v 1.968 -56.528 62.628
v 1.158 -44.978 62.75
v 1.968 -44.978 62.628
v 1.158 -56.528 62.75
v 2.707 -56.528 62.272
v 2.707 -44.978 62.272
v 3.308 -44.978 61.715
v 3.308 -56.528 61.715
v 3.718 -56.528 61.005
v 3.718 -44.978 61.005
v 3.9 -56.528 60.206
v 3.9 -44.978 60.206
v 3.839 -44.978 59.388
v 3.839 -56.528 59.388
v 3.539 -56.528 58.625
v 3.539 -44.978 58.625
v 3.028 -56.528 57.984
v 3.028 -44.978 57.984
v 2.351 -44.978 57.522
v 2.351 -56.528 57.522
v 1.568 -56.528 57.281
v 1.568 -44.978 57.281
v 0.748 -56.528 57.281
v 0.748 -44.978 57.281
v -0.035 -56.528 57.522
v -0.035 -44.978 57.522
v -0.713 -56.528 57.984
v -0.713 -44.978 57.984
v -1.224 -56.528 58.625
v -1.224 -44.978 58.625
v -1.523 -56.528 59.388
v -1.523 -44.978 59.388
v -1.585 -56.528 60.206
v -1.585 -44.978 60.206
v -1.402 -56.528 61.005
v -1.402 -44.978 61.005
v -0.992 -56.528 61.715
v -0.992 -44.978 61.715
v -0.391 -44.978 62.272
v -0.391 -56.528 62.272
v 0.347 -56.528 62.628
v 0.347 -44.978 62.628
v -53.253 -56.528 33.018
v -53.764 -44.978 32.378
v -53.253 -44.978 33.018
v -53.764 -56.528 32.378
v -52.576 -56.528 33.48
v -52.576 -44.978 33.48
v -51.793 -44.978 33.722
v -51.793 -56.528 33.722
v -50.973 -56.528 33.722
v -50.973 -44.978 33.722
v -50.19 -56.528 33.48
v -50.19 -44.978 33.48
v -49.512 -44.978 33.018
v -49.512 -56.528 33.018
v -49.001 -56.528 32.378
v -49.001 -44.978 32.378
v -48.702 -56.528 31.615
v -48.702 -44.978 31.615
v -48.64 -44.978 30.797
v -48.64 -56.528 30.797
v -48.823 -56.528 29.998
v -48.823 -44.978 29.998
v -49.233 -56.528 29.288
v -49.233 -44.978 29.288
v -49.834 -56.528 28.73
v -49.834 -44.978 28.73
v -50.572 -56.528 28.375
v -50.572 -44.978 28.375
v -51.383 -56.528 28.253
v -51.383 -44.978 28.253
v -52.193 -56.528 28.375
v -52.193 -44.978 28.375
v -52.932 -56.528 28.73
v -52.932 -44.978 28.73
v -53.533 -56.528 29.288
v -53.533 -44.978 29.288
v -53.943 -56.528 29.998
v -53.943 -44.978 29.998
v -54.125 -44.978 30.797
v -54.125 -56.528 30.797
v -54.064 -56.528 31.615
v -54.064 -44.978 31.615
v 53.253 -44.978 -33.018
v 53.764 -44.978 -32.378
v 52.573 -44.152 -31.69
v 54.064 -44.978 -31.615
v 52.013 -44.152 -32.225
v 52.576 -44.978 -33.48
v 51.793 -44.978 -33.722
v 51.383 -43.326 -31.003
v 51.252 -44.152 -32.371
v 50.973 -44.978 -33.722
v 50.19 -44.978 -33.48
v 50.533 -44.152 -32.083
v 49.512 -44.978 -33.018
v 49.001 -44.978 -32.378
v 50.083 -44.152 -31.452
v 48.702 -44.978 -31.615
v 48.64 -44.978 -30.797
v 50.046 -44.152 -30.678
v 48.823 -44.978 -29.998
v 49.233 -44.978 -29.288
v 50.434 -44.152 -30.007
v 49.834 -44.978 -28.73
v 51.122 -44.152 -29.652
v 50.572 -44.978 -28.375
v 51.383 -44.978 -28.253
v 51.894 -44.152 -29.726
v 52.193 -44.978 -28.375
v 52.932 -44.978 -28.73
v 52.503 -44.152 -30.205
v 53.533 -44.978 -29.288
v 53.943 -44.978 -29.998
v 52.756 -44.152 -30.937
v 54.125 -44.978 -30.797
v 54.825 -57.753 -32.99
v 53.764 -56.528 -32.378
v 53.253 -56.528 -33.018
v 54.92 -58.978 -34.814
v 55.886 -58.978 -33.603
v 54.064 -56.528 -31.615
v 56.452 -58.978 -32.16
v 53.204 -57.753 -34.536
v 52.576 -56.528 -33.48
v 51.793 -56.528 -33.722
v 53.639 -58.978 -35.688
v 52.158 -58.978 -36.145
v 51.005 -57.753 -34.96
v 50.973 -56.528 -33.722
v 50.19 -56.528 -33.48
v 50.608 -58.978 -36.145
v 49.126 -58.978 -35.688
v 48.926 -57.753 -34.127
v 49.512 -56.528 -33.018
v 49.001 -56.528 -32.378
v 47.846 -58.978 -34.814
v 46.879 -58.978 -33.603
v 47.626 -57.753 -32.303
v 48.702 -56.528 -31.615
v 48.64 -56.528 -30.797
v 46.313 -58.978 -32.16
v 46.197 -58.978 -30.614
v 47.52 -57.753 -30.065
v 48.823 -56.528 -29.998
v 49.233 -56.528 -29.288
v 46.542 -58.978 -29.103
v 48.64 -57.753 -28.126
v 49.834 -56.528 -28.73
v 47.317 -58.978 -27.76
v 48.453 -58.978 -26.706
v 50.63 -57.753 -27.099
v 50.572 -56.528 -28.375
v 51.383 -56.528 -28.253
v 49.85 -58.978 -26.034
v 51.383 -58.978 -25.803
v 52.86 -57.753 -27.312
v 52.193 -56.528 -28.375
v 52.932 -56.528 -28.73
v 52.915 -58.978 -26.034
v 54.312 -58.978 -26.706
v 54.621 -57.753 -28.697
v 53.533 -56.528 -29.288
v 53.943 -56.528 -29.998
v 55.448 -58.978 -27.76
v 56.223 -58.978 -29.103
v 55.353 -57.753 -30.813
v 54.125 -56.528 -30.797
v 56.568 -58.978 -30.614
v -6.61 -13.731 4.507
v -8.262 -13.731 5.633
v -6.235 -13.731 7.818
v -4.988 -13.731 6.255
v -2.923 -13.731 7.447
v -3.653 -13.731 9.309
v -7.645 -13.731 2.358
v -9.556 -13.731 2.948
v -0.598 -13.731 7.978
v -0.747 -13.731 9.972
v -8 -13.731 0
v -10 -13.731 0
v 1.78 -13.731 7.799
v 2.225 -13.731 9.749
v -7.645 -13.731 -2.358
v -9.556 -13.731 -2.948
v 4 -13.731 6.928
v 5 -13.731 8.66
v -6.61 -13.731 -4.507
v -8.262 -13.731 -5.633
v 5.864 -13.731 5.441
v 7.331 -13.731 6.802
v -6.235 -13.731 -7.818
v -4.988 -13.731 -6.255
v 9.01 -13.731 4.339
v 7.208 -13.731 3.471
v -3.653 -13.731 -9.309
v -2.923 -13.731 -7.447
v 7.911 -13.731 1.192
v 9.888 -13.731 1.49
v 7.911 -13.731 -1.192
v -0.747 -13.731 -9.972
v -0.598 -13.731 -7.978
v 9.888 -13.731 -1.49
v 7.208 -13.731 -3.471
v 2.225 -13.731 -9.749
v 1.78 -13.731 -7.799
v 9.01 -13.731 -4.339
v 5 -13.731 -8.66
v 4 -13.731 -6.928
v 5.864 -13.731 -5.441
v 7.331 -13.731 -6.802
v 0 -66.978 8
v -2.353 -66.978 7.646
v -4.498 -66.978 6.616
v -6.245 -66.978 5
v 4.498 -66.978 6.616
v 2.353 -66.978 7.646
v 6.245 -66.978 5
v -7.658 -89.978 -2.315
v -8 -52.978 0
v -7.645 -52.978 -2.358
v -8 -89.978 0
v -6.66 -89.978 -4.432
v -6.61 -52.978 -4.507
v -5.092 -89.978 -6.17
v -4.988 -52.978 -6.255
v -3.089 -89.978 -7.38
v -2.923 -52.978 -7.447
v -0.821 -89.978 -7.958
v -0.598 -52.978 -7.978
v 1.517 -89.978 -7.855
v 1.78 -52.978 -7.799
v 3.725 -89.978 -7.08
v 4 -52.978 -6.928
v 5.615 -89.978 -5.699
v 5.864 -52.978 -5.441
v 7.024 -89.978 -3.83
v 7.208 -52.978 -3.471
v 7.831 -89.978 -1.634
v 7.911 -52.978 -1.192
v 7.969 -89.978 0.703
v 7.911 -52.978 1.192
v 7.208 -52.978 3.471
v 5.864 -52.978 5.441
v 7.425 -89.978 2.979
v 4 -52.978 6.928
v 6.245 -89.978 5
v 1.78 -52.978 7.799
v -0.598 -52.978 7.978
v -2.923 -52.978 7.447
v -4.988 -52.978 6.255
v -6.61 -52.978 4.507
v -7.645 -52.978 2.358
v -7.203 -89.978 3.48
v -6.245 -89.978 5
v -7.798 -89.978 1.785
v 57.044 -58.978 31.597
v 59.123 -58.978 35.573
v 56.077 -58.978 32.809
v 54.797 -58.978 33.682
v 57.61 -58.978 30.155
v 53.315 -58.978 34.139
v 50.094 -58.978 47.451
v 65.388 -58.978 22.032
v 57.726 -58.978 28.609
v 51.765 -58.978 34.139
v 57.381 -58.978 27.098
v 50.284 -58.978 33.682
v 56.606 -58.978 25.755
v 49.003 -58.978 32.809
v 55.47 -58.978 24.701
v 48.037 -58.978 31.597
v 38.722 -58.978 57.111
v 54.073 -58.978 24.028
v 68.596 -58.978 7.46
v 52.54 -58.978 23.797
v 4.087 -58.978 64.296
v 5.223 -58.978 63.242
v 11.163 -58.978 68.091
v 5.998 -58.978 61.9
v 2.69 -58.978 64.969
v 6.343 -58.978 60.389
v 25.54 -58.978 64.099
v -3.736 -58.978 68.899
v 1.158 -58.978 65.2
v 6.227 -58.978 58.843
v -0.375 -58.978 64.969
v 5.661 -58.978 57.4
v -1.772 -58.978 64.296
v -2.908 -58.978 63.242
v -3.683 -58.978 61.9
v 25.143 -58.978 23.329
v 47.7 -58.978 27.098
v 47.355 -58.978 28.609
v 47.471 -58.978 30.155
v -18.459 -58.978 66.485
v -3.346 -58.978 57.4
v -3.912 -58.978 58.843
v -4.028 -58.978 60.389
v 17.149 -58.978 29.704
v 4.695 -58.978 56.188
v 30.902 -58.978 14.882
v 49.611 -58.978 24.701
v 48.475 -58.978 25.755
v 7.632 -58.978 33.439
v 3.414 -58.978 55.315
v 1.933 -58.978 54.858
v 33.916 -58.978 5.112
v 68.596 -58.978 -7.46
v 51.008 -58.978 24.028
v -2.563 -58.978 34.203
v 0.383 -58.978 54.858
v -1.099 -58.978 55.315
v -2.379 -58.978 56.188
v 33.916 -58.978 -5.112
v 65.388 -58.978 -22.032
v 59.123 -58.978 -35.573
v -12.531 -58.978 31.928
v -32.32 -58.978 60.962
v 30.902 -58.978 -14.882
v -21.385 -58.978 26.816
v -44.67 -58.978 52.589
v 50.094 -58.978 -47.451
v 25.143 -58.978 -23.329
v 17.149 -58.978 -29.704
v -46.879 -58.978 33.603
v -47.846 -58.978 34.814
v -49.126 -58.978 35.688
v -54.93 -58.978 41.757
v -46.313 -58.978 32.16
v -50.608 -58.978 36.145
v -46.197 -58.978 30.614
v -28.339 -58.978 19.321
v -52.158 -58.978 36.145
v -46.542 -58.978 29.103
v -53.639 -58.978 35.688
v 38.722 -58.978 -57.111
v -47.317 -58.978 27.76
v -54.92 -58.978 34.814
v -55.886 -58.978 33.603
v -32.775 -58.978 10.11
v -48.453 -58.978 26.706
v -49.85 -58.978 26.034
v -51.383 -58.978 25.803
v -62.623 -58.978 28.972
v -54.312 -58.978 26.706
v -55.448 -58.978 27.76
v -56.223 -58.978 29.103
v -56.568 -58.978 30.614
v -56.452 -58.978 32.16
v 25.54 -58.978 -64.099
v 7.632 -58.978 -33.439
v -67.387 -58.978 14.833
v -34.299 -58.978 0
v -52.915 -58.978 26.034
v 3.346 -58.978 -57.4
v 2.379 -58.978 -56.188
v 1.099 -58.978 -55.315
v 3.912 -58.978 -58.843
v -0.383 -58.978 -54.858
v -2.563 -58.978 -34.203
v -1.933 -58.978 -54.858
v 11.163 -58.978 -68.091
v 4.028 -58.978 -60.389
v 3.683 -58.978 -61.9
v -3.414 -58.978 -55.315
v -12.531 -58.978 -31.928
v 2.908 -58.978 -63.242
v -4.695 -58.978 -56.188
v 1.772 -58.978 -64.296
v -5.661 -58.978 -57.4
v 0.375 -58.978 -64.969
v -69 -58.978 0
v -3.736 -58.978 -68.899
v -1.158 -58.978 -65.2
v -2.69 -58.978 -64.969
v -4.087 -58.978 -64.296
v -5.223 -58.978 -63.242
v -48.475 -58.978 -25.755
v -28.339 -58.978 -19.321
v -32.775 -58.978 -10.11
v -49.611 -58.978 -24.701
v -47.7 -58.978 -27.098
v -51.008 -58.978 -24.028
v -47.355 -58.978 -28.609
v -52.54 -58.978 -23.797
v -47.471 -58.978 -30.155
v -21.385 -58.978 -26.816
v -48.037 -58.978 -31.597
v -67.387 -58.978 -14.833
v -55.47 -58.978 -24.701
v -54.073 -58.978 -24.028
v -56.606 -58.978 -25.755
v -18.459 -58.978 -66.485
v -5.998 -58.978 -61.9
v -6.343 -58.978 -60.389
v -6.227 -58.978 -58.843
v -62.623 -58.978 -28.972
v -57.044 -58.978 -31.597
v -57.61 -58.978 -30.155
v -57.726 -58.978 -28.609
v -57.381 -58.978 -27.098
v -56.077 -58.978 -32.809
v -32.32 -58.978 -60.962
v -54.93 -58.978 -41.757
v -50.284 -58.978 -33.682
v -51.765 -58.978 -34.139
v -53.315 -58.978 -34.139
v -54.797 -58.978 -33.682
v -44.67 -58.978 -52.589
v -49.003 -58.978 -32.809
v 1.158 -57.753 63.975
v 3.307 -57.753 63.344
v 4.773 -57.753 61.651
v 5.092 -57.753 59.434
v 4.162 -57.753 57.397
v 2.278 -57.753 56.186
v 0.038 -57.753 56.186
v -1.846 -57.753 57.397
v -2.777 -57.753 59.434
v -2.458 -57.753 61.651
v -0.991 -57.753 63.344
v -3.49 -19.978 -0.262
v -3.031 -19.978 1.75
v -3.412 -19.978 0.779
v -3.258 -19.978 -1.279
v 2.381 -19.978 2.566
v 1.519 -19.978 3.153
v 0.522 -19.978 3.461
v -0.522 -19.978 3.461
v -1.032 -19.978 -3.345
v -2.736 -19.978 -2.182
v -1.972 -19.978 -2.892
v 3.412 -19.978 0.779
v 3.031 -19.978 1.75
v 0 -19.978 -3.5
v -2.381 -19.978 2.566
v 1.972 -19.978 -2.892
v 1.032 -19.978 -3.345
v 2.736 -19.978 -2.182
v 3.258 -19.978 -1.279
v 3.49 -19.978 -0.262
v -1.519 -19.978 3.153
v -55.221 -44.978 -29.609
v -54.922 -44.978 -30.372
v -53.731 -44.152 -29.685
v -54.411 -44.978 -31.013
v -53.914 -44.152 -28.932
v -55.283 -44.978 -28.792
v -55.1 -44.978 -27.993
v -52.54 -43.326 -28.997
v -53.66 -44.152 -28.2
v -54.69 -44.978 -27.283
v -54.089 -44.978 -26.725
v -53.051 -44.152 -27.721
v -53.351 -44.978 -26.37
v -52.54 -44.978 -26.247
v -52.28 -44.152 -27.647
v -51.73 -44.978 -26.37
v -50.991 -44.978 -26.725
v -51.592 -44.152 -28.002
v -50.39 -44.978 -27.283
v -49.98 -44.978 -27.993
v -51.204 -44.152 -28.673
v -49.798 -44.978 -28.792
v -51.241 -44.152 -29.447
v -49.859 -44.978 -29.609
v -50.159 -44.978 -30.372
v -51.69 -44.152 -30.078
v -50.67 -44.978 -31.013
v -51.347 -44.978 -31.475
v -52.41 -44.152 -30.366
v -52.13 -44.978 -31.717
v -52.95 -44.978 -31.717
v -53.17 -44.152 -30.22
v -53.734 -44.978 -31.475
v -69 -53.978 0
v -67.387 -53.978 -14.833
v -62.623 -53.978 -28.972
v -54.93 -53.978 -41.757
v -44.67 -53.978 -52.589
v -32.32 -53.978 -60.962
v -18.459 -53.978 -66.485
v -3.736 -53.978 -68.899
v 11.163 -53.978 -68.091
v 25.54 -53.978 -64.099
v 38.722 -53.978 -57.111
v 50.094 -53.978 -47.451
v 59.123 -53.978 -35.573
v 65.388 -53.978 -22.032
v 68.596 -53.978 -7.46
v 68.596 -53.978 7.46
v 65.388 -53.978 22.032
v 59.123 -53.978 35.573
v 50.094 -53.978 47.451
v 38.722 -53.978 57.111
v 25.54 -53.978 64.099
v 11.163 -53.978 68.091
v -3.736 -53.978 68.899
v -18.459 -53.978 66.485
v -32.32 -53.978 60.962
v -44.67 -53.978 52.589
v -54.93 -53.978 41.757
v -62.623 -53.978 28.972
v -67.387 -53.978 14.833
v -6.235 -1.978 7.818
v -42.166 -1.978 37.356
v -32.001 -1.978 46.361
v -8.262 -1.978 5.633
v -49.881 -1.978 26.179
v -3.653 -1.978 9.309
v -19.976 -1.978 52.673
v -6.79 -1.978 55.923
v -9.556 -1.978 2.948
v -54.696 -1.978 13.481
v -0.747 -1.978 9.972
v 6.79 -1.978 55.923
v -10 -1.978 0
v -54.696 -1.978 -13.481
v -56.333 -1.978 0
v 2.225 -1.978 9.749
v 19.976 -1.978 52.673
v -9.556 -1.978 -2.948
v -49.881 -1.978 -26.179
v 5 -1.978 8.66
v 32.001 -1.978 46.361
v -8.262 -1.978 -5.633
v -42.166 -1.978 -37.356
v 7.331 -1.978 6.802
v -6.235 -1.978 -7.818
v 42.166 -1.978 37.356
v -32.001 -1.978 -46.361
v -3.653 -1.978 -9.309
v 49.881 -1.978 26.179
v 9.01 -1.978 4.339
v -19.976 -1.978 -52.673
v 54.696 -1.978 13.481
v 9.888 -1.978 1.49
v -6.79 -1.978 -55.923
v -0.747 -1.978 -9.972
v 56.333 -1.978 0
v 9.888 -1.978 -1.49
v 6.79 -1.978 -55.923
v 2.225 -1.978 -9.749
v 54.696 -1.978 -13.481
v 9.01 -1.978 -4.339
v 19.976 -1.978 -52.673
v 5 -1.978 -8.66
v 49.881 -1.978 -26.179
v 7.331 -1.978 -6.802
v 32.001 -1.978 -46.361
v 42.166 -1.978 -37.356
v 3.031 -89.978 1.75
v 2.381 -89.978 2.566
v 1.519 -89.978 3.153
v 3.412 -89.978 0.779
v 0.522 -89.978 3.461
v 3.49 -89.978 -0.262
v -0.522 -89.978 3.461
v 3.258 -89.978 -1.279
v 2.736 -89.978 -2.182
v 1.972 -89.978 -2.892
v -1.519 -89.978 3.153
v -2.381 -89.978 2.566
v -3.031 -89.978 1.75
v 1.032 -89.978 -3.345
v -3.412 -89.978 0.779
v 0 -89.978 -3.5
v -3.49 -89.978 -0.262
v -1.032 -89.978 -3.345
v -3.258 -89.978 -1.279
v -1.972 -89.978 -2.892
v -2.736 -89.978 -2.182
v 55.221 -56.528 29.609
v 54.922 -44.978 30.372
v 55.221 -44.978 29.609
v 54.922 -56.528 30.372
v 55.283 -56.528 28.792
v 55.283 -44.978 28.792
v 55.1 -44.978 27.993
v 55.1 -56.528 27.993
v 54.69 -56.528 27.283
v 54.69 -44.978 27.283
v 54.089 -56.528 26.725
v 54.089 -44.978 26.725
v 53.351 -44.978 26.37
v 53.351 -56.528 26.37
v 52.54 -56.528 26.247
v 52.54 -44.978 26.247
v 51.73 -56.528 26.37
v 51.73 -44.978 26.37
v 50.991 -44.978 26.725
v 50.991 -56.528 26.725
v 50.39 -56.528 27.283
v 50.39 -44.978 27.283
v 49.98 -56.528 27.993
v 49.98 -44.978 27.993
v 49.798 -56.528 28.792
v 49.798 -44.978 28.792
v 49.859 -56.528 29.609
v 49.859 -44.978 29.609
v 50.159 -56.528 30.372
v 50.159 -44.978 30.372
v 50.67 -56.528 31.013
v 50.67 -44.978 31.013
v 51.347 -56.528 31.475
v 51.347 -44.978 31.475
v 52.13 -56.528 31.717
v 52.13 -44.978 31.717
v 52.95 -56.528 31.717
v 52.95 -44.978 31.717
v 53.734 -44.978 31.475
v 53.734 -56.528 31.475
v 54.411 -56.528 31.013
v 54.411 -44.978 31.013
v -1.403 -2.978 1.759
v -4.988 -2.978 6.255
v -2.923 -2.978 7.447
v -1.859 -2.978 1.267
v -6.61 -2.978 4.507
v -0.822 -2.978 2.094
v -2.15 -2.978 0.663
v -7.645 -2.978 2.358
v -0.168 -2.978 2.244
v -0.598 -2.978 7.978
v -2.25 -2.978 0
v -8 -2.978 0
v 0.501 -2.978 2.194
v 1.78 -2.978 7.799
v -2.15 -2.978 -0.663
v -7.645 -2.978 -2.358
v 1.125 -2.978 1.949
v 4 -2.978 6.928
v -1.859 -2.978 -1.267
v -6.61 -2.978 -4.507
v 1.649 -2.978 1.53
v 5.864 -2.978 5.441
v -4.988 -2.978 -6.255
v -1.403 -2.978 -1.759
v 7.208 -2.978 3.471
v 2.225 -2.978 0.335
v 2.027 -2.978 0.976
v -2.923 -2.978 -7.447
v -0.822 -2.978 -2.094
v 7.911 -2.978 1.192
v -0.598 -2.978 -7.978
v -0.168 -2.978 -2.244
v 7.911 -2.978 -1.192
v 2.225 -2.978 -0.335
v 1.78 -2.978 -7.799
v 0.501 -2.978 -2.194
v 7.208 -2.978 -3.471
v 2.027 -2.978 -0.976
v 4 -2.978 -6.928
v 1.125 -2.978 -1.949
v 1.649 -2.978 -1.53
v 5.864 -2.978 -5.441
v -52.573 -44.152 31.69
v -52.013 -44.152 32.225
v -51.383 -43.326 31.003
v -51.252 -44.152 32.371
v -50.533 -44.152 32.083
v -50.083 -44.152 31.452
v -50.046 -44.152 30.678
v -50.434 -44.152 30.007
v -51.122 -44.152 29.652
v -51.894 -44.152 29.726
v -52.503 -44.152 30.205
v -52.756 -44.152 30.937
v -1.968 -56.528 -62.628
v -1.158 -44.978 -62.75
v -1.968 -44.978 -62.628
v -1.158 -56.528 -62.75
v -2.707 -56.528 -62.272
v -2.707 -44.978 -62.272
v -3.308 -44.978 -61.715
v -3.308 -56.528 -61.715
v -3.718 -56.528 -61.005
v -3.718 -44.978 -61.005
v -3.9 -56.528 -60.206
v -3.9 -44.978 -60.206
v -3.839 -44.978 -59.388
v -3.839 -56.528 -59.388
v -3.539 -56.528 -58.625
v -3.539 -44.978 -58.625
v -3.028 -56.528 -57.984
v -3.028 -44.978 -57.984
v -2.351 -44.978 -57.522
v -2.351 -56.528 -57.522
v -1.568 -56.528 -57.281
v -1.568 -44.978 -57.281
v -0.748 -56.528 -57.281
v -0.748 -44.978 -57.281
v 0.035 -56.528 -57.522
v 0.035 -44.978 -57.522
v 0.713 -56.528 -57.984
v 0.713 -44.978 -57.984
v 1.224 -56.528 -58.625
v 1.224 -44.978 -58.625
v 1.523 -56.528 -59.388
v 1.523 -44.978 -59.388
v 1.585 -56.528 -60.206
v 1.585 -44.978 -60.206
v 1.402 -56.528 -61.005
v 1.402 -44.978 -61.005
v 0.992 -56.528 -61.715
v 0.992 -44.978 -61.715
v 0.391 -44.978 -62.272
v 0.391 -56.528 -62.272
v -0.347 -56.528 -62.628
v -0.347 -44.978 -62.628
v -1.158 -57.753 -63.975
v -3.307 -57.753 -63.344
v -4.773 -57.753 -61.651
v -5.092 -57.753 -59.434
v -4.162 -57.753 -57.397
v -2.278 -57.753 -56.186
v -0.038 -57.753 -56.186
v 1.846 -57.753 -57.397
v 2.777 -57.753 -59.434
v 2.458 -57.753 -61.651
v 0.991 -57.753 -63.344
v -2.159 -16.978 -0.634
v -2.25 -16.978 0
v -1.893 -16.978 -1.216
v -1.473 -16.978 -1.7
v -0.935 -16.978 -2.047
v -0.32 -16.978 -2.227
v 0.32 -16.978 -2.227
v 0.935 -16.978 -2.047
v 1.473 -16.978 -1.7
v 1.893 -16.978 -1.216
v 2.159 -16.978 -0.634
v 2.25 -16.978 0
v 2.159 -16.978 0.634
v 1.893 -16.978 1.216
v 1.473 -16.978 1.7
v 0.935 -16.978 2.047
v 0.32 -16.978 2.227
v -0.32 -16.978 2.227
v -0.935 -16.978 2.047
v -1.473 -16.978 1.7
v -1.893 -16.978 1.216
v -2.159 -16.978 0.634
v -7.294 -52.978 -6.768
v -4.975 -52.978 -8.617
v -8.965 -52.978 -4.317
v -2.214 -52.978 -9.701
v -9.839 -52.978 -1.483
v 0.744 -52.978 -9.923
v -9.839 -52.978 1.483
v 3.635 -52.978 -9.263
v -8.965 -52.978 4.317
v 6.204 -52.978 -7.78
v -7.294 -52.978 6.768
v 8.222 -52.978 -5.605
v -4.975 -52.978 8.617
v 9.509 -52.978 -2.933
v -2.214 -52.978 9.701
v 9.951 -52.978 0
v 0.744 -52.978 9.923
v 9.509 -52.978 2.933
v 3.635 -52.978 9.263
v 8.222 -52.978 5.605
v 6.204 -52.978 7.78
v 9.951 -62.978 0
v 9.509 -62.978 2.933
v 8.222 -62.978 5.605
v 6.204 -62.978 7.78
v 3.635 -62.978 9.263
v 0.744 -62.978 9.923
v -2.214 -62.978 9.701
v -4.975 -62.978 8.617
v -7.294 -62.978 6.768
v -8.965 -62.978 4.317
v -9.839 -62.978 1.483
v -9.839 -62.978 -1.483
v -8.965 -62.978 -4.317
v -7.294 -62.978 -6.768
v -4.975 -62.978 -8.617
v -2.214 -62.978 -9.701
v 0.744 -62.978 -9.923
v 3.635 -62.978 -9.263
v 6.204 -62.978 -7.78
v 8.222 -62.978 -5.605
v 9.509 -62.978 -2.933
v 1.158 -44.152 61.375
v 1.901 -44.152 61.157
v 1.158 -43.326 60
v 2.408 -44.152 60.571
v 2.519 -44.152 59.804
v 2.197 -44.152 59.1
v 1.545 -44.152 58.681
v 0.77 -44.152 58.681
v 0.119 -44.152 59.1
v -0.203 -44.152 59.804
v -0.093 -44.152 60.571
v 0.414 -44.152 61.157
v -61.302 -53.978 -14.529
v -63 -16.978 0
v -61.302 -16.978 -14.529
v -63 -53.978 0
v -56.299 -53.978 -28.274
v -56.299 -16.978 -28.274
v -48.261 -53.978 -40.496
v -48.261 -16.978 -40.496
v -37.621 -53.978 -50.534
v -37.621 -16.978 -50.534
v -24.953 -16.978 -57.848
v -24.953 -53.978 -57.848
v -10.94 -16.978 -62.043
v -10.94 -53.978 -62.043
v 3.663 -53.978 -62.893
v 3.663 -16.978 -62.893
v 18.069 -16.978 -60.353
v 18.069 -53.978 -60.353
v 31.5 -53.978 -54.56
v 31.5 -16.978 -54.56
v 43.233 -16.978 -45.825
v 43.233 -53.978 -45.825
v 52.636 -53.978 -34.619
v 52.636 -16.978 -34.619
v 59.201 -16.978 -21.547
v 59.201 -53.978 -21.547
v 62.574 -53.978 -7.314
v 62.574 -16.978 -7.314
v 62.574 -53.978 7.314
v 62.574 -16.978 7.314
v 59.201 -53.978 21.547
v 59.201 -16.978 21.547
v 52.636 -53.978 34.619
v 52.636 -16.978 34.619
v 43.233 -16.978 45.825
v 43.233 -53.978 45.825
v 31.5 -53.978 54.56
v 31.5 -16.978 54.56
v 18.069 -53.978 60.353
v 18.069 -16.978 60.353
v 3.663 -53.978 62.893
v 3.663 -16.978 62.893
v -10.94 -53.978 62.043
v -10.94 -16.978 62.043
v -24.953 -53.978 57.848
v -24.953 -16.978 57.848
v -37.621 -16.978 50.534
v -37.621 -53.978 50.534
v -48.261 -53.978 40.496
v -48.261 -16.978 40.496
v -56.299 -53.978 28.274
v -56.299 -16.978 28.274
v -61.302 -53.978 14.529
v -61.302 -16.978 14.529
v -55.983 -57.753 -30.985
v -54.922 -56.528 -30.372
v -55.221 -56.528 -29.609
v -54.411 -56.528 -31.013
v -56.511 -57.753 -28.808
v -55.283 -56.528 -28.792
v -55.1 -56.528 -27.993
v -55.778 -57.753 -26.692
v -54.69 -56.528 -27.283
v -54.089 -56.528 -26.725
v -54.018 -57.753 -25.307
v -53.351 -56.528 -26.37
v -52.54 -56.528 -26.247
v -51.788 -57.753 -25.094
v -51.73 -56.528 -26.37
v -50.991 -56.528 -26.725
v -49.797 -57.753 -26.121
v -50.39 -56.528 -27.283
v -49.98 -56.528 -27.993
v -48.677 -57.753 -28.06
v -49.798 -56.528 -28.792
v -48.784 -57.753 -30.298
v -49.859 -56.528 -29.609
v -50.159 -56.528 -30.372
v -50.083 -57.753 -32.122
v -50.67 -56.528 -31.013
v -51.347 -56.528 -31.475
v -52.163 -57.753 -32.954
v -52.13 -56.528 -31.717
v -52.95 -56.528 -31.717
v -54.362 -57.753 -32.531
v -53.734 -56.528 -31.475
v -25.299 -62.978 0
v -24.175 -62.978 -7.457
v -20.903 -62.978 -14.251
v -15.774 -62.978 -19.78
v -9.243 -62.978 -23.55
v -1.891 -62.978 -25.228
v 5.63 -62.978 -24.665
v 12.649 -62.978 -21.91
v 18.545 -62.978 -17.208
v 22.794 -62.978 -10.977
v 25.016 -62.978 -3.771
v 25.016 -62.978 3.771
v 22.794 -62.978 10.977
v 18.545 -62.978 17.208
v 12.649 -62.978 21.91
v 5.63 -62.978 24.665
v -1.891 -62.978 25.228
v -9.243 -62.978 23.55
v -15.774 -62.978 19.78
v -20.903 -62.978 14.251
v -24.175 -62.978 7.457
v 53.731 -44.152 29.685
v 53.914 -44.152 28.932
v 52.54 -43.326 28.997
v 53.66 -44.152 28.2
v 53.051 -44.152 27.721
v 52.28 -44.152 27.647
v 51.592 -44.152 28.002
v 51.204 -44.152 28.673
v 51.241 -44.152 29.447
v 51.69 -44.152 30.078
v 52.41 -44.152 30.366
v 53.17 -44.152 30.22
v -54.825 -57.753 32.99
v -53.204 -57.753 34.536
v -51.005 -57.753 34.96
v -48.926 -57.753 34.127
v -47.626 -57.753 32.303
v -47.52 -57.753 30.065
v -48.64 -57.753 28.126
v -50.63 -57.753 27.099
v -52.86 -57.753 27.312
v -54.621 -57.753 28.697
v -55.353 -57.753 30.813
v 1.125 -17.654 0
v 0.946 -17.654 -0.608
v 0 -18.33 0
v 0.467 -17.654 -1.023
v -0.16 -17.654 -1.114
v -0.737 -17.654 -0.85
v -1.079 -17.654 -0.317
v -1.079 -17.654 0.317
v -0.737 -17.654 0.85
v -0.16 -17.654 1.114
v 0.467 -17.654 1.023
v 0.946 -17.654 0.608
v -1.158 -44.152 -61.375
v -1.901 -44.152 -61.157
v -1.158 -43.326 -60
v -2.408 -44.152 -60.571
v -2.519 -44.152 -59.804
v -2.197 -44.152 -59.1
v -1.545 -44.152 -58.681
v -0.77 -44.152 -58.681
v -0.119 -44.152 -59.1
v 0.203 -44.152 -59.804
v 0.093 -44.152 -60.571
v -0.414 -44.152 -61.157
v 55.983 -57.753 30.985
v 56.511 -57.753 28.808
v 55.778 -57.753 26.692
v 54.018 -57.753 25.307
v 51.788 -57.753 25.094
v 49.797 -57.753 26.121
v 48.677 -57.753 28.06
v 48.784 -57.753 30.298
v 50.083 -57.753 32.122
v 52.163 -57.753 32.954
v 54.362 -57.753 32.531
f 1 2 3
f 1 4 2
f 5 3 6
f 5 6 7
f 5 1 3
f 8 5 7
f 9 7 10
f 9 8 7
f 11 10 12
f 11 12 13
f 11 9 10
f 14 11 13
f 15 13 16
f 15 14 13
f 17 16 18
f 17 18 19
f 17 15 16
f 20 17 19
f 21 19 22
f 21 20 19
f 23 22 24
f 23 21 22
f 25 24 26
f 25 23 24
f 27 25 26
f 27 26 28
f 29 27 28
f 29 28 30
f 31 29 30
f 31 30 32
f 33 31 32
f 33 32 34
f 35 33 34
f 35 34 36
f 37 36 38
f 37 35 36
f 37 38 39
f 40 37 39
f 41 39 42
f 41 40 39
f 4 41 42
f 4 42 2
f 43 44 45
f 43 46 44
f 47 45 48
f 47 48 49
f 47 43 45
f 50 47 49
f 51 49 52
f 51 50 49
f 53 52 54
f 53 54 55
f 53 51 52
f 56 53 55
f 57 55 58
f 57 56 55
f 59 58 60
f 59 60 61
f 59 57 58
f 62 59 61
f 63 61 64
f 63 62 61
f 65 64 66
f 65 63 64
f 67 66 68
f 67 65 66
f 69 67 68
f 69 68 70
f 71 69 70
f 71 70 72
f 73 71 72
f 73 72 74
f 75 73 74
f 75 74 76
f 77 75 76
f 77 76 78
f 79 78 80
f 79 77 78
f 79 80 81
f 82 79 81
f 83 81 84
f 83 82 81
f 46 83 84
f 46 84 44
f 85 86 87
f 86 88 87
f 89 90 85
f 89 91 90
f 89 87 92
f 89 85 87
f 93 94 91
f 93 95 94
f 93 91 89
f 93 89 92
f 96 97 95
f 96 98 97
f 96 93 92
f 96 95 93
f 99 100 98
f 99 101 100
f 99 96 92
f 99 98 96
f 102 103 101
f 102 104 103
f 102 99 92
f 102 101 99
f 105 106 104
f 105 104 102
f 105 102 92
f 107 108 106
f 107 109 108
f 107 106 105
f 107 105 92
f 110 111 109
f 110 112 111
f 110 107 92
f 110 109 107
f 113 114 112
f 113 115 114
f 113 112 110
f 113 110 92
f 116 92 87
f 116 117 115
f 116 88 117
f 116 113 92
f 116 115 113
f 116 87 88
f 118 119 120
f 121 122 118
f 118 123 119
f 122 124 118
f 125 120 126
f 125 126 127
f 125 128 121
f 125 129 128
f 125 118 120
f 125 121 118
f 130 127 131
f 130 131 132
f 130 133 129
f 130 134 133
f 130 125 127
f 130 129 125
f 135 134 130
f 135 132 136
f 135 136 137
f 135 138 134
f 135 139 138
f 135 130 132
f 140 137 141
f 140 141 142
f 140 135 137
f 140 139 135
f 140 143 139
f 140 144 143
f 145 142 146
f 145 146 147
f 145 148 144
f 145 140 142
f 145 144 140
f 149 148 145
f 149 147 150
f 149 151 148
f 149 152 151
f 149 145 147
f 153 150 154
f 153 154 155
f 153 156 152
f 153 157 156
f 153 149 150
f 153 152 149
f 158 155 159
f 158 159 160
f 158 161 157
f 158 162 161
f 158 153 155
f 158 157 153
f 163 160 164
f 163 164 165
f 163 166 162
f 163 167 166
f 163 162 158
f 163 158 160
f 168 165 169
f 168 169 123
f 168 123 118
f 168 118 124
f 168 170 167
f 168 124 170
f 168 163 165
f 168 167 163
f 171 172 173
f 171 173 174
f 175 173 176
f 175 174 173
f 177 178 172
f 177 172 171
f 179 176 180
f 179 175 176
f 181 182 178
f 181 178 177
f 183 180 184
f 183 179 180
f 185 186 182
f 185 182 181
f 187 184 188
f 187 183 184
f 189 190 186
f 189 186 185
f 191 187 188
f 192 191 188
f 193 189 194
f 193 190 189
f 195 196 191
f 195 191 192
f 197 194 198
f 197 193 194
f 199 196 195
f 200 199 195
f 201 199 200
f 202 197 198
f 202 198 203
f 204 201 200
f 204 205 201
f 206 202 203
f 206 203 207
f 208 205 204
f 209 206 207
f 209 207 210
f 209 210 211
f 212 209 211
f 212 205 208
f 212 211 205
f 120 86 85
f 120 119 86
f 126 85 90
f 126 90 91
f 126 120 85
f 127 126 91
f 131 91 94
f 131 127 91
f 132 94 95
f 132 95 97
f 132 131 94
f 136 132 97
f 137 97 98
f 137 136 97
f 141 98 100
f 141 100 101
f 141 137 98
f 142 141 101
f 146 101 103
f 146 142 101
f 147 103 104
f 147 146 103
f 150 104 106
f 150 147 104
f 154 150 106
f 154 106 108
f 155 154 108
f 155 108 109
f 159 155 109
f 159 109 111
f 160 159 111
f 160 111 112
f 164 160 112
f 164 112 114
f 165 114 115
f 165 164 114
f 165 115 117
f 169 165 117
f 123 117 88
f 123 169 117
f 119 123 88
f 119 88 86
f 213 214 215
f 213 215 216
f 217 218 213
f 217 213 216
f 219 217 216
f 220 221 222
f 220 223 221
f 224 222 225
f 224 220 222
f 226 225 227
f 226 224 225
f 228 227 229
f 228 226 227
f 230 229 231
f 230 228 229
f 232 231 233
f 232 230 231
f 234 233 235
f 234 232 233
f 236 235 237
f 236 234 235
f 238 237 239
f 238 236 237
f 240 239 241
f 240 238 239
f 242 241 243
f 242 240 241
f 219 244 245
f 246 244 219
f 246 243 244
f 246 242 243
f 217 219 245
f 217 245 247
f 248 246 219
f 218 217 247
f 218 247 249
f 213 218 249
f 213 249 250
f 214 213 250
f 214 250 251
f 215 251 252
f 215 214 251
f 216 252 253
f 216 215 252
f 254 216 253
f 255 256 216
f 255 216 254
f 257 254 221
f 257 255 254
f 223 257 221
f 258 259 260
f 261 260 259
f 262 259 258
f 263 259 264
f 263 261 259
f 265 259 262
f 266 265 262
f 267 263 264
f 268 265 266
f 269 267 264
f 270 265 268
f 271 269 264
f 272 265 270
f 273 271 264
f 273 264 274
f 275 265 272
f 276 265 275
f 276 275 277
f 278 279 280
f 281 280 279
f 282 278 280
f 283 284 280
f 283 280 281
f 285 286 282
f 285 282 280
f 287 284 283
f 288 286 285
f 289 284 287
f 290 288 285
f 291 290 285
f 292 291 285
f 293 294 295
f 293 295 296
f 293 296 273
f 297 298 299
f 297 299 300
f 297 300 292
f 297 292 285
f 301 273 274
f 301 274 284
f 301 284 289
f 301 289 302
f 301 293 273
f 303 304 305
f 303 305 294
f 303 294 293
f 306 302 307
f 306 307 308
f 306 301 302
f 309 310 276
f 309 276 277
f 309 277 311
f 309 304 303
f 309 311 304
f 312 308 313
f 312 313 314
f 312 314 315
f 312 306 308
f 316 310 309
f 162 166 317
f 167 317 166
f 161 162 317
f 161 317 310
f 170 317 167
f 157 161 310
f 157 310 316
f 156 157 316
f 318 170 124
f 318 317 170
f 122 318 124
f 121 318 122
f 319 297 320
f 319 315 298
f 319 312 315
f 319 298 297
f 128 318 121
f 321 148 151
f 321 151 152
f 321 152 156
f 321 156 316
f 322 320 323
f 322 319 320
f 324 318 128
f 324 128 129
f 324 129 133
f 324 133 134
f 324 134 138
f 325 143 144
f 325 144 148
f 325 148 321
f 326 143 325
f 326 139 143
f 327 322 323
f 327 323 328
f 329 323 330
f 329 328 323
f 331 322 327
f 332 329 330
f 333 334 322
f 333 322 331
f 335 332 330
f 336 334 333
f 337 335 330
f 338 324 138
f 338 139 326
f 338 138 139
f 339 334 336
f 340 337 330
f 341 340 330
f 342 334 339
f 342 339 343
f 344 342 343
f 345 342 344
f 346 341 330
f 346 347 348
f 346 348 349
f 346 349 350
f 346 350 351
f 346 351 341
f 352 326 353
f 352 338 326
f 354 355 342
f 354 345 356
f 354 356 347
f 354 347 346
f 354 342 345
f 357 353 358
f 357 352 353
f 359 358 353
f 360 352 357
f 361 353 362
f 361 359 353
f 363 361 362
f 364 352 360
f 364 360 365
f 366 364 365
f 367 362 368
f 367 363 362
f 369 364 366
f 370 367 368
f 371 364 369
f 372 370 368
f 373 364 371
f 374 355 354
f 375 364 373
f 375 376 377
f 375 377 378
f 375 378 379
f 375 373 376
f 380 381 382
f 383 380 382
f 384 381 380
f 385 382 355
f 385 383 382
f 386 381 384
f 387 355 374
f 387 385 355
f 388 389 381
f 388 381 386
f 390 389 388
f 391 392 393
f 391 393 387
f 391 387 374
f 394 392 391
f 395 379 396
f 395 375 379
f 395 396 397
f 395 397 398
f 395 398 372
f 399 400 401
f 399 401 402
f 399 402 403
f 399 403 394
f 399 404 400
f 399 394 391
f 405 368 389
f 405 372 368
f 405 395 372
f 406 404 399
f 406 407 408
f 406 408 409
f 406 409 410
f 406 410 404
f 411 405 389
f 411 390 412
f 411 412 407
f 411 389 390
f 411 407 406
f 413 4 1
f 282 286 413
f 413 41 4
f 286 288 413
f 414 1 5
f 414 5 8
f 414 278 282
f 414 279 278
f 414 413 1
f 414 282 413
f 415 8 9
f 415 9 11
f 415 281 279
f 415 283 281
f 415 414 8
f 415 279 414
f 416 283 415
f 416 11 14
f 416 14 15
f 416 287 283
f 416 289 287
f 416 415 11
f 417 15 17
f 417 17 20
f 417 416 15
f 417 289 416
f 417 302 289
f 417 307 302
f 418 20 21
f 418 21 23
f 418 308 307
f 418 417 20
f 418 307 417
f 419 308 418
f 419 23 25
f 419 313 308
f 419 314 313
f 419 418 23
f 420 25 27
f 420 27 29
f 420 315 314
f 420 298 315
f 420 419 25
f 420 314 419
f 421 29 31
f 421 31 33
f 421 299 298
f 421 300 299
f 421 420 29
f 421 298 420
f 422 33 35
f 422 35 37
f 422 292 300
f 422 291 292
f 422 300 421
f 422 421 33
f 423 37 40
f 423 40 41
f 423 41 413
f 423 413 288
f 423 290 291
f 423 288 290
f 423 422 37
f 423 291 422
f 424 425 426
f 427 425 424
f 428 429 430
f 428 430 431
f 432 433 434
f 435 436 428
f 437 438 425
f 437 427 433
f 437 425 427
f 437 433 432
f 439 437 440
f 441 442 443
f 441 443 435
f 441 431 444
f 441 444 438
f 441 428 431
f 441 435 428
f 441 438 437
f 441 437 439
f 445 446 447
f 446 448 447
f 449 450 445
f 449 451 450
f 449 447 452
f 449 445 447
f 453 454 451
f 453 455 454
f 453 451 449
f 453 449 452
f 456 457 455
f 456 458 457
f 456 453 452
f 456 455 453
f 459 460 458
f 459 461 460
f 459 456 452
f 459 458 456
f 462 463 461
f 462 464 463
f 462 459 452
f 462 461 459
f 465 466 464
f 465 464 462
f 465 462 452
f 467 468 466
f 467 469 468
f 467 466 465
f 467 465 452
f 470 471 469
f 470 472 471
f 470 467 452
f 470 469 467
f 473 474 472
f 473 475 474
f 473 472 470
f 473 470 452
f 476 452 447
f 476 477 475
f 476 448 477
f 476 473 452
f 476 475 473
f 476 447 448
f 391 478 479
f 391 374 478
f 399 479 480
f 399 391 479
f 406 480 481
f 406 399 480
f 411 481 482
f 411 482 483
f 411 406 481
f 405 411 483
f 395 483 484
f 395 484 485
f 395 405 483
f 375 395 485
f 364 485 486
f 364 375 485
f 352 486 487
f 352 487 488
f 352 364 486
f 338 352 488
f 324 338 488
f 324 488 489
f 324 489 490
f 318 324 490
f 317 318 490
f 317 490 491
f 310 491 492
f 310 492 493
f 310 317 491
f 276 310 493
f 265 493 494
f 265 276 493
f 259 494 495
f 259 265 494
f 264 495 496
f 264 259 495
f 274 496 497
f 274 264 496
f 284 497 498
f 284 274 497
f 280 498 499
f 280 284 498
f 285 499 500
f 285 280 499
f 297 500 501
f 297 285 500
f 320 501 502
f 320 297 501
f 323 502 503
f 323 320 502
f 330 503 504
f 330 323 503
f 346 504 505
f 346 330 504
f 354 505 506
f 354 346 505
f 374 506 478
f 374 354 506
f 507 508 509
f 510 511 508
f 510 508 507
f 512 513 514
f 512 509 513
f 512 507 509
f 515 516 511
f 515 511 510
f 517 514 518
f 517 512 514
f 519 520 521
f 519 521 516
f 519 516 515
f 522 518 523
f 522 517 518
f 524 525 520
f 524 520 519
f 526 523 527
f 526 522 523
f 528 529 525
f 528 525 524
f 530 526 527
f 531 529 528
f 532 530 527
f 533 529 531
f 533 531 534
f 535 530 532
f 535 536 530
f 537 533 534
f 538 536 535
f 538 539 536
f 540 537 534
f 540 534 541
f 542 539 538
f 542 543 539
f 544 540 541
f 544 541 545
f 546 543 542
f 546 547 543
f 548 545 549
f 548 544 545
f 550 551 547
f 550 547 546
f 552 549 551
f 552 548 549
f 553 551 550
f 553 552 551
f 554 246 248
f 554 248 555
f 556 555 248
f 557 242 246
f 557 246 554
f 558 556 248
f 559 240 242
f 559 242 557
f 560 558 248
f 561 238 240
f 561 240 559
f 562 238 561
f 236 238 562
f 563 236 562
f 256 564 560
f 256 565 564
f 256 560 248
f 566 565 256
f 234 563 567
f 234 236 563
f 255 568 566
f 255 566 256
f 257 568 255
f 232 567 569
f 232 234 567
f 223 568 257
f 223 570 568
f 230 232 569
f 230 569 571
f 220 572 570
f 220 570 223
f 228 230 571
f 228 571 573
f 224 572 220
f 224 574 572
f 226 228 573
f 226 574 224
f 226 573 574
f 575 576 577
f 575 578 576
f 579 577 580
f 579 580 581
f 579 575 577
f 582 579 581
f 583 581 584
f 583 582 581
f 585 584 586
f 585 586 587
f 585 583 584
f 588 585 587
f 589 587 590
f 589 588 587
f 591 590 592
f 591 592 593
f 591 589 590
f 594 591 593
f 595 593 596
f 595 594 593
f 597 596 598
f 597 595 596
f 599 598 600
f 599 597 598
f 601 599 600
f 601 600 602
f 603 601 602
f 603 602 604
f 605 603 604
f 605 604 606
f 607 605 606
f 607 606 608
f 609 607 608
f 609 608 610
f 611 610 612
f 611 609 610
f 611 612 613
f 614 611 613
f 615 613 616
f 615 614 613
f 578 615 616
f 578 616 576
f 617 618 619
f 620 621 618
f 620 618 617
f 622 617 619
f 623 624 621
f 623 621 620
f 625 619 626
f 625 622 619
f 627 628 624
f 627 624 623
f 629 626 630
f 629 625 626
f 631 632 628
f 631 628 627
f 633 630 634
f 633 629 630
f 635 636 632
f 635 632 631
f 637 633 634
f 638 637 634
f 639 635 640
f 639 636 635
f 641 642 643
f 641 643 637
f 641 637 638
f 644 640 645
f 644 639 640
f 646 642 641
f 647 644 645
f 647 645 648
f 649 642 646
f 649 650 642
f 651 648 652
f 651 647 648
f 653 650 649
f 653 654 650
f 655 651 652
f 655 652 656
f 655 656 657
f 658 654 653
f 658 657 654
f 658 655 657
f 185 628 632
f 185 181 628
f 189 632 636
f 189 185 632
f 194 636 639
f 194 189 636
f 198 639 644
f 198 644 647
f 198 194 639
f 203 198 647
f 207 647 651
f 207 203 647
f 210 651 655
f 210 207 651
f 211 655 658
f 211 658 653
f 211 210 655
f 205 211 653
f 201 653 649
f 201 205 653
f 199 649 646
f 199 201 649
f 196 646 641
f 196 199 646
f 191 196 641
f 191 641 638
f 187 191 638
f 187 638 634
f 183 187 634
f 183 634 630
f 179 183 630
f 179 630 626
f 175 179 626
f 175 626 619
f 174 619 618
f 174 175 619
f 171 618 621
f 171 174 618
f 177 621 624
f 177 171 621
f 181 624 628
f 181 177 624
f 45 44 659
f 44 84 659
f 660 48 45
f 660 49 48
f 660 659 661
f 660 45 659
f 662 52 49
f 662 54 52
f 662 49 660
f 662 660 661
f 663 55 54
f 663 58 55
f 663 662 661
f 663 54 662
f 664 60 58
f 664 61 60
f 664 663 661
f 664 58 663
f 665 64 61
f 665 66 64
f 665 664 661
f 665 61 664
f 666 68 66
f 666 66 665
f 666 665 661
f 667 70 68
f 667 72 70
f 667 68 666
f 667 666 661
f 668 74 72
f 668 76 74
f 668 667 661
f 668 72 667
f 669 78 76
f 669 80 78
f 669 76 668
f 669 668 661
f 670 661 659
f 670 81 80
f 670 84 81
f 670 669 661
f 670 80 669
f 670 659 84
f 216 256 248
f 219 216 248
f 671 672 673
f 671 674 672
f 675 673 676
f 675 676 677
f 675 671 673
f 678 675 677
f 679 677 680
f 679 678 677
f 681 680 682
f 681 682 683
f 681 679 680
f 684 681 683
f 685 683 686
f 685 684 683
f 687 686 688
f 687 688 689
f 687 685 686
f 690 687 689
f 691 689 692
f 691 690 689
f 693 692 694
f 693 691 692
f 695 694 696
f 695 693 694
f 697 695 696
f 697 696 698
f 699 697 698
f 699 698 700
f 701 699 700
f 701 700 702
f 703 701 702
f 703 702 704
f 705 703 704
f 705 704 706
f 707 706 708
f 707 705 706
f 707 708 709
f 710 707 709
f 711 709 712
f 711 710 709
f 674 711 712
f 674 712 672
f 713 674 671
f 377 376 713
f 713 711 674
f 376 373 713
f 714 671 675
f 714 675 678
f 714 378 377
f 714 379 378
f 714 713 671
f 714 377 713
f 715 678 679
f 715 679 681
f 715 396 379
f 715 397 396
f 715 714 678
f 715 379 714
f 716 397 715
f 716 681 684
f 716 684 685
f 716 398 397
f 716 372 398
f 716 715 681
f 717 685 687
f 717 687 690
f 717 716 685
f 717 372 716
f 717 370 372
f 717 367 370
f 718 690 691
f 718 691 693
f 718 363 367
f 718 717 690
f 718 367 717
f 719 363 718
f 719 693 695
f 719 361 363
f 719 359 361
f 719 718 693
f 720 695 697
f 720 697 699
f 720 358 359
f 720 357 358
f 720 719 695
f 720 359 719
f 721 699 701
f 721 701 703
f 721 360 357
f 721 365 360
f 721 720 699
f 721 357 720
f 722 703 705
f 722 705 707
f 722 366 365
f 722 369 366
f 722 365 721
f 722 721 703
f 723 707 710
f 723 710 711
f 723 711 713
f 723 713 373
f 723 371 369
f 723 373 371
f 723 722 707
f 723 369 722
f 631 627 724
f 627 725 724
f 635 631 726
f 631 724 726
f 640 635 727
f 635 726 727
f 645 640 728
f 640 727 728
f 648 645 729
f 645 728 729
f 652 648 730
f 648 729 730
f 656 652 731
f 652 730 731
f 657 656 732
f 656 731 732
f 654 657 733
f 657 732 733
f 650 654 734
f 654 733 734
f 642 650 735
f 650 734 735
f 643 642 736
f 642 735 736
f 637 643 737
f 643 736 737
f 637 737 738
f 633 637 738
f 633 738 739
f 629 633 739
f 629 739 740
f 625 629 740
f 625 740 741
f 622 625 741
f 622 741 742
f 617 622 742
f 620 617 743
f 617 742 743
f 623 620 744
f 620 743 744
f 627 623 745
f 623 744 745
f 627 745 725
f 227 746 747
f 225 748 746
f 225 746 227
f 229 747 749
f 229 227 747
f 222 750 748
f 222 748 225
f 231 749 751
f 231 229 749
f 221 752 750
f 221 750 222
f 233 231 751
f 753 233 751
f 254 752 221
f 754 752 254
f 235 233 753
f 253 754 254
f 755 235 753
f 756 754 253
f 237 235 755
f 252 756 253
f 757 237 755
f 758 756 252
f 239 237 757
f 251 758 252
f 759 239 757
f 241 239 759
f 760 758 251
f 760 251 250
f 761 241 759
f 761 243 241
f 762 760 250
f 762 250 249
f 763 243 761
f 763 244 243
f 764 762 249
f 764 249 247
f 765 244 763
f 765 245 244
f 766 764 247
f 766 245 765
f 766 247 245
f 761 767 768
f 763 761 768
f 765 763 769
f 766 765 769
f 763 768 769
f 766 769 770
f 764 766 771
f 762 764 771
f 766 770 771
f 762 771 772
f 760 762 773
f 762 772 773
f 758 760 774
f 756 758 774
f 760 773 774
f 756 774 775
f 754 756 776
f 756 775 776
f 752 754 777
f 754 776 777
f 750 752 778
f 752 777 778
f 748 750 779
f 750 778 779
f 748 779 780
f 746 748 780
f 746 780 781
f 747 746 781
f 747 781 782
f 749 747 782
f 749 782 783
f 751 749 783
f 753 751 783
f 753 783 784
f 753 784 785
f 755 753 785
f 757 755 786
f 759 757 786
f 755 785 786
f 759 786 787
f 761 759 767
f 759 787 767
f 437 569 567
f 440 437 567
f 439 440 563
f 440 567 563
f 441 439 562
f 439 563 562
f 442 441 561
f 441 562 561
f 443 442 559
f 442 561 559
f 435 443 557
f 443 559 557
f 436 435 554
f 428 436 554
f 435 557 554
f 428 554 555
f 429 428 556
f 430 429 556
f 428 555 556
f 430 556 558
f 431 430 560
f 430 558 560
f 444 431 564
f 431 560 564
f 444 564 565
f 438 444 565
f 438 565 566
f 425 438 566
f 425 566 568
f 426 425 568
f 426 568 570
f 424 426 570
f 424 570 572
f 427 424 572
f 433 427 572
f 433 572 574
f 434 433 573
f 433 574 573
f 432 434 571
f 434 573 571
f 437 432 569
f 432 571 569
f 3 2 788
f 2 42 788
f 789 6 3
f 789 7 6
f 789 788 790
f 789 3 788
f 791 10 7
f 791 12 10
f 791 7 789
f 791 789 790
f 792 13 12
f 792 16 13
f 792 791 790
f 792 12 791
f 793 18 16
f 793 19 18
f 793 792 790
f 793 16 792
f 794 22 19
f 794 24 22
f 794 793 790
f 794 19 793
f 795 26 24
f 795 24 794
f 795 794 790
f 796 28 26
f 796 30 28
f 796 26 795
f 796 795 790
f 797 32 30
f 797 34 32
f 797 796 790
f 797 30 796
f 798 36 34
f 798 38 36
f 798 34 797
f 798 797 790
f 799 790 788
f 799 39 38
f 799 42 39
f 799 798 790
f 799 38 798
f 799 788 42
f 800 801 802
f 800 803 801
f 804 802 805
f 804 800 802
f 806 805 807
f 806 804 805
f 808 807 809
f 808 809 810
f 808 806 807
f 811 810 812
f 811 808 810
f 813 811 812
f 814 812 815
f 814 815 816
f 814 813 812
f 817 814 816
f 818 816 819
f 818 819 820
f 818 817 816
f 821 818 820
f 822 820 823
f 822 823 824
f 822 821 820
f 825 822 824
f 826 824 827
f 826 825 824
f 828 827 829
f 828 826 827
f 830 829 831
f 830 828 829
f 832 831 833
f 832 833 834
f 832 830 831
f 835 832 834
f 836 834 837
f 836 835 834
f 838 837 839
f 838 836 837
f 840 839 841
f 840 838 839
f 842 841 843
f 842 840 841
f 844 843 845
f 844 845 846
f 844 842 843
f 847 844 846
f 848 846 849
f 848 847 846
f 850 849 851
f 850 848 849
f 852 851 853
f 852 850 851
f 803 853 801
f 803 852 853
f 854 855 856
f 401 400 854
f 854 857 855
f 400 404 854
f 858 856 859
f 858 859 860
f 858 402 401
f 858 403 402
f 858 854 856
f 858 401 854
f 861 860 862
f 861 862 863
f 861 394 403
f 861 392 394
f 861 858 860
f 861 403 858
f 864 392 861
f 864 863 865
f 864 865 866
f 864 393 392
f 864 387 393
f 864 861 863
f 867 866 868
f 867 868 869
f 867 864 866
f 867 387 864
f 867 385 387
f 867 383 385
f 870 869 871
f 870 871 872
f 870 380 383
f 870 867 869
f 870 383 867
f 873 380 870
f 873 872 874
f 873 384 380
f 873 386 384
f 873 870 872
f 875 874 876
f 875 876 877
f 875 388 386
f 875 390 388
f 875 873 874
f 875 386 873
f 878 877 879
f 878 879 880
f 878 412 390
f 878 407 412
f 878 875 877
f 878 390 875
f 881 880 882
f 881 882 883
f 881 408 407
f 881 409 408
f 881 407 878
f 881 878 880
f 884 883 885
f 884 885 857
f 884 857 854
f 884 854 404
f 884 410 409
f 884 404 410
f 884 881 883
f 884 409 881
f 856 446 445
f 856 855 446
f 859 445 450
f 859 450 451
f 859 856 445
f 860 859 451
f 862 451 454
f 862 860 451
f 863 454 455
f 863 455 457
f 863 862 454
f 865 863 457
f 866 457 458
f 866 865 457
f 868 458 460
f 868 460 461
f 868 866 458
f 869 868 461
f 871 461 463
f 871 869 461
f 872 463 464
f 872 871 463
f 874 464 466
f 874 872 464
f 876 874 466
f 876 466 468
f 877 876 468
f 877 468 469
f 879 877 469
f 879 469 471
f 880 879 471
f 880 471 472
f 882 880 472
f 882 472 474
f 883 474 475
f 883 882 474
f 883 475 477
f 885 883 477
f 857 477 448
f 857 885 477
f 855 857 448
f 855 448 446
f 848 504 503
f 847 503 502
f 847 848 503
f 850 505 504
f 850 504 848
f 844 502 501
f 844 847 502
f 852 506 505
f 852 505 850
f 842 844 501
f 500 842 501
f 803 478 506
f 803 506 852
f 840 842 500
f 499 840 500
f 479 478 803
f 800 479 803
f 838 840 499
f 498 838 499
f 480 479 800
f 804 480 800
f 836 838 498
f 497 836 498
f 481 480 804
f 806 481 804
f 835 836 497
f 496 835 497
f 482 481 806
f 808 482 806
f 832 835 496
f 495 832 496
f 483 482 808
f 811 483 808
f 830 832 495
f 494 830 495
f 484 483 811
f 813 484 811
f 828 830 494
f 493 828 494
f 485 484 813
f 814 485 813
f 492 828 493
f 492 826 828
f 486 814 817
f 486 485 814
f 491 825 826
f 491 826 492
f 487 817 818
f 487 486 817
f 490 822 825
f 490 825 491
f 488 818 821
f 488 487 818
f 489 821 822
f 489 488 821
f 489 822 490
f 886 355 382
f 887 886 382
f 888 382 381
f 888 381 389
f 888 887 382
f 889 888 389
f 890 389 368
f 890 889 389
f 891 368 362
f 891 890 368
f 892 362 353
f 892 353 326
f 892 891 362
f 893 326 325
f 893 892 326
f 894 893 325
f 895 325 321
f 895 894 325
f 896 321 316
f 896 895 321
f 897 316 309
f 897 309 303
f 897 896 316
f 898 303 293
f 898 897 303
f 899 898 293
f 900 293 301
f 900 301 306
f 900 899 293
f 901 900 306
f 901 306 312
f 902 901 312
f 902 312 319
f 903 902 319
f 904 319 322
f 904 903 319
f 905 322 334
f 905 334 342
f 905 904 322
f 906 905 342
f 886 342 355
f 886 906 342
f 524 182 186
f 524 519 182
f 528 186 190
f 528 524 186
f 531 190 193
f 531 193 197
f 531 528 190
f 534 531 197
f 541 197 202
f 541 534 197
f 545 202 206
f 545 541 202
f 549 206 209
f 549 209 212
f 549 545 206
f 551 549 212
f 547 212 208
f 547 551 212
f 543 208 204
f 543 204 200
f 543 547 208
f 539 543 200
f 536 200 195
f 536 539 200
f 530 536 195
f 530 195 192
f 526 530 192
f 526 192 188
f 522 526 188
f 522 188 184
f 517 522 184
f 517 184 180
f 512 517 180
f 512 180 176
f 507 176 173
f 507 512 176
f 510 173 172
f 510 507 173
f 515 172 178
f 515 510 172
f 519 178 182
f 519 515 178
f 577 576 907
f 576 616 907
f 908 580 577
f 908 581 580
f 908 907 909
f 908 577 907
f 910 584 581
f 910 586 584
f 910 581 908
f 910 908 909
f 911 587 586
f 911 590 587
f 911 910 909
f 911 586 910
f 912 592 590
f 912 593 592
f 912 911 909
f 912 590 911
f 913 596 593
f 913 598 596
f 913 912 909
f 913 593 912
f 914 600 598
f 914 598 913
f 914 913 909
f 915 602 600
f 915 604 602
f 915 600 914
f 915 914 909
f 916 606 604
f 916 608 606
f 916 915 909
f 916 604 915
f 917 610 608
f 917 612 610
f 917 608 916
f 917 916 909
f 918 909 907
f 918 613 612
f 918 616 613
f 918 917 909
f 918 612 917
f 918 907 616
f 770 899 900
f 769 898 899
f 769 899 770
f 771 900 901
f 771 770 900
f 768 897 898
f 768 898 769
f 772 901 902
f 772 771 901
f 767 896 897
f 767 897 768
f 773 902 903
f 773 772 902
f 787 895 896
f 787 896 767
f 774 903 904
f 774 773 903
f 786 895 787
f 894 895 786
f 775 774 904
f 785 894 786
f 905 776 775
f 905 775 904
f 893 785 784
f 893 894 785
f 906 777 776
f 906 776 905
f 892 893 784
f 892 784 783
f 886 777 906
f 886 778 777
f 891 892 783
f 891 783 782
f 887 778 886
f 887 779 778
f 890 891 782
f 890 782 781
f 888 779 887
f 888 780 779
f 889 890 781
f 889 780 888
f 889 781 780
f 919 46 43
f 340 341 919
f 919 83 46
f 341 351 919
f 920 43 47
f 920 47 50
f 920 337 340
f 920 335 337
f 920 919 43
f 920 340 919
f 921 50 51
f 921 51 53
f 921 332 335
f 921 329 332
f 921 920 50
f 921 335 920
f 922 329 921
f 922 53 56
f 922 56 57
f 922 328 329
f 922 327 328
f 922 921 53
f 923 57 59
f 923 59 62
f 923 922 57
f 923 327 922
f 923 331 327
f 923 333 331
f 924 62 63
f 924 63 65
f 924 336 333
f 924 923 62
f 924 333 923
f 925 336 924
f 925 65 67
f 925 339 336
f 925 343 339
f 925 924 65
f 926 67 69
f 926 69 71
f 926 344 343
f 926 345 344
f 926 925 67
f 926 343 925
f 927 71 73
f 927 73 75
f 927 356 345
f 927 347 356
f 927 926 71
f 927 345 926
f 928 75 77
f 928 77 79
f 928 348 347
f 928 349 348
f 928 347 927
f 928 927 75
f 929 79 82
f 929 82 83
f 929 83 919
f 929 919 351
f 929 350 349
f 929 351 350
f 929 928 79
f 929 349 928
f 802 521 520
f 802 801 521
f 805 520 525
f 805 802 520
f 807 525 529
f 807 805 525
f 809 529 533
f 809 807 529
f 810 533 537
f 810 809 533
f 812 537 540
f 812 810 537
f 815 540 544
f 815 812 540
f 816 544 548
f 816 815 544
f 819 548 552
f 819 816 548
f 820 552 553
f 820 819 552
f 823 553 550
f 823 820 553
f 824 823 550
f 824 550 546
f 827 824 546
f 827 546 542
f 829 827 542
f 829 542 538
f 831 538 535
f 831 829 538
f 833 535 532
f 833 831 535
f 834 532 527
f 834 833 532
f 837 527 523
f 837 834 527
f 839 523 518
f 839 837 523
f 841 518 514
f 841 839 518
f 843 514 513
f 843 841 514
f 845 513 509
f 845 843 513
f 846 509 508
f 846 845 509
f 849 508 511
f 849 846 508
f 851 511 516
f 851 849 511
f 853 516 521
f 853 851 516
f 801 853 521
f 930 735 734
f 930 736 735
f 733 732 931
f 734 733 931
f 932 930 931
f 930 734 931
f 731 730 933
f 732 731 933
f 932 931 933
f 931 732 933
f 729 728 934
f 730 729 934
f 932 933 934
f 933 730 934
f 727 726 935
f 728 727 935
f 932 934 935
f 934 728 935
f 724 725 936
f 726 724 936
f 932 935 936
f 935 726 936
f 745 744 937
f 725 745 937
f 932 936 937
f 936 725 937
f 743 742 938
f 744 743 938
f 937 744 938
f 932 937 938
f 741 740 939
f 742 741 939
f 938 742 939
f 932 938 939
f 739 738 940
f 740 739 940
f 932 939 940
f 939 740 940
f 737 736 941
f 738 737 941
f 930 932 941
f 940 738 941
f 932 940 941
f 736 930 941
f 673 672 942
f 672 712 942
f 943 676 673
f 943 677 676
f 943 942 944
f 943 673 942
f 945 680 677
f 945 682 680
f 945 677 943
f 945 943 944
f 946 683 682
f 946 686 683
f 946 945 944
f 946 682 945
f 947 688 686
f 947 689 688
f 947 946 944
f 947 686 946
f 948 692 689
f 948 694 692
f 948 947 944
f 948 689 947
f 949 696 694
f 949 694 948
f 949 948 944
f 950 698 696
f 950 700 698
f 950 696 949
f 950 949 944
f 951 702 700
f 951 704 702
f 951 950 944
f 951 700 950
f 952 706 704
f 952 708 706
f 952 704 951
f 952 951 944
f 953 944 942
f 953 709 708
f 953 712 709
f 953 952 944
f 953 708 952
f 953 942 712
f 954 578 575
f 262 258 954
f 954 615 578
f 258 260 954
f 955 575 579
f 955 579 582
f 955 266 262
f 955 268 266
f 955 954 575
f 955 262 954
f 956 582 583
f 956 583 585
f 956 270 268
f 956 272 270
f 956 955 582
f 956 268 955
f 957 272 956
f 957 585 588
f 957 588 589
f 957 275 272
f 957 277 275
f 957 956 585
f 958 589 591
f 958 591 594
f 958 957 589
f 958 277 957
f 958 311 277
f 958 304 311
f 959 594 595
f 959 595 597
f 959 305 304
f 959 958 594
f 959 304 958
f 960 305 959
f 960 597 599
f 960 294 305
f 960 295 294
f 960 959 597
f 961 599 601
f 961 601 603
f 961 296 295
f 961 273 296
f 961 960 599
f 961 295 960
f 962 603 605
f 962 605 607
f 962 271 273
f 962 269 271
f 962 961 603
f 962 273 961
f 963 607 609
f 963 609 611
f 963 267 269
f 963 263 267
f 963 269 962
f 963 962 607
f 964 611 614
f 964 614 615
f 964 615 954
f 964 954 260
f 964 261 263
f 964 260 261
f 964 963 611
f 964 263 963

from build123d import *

# Parameters (mm, degrees)
EXTRUDE_START            = 27
SKETCH_3_R               = 8
EXTRUDE_1_DEPTH          = 27
SKETCH_4_W               = 21.869380784
SKETCH_4_H               = 6.809627549
CUT_EXTRUDE_1_DEPTH      = 23
SKETCH_5_R               = 3.5
CUT_EXTRUDE_2_DEPTH      = 70
PATTERN_CIRCULAR_1_COUNT = 6
HOLE_WIZARD_M41_D        = 4.5
HOLE_WIZARD_M41_DEPTH    = 14
HOLE_WIZARD_M41_TIP      = 1.351936393
SKETCH_14_R              = 9.95061624
SKETCH_14_R_2            = 8
CUT_EXTRUDE_5_DEPTH      = 10


with BuildPart() as part:
    # Эскиз2 → Повернуть1 (revolve)
    with BuildSketch(Plane.XY):
        Polygon((-10, -1.978246769), (-56.333333333, -1.978246769), (-63, -16.978246769), (-63, -53.978246769), (-69, -53.978246769), (-69, -58.978246769), (-34.298944769, -58.978246769), (-25.298944769, -62.978246769), (0, -62.978246769), (0, -2.978246769), (-8, -2.978246769), (-8, -13.730591033), (-10, -13.730591033), align=None)
    revolve(axis=Axis((0, -2.978246769, 0), (0, -1, 0)))

    # Эскиз3 → Бобышка-Вытянуть1 (add)
    with BuildSketch(Plane.XZ.offset(62.978246769).offset(EXTRUDE_START)):
        with Locations(Location((0, 0, 0), (0, 0, 180))):
            Circle(SKETCH_3_R)
    extrude(amount=-EXTRUDE_1_DEPTH)

    # Эскиз4 → Вырез-Вытянуть1 (cut)
    with BuildSketch(Plane.XZ.offset(89.978246769)):
        with Locations((-0.065477188, 8.404813774)):
            Rectangle(SKETCH_4_W, SKETCH_4_H)
    extrude(amount=-CUT_EXTRUDE_1_DEPTH, mode=Mode.SUBTRACT)

    # Эскиз5 → Вырез-Вытянуть2 (cut)
    with BuildSketch(Plane.XZ.offset(89.978246769)):
        with Locations(Location((0, 0, 0), (0, 0, 270))):
            Circle(SKETCH_5_R)
    extrude(amount=-CUT_EXTRUDE_2_DEPTH, mode=Mode.SUBTRACT)

    # Эскиз7 → Зенковка для винта с полупотайной головкой M51 (revolve, cut)
    with BuildSketch(Plane(origin=(-1.157683247, -58.978246769, -60), x_dir=(0, 0, -1), z_dir=(1, 0, 0))):
        Polygon((0, 0), (0, 15.652366702), (2.75, 14), (2.75, 2.45), (5.2, 0), align=None)
    hole_wizard_m51 = revolve(axis=Axis((-1.157683247, -65.328246769, -60), (0, 1, 0)), mode=Mode.SUBTRACT)

    # Круговой массив1: Зенковка для винта с полупотайной головкой M51 ×6 about axis
    pattern_circular_1_axis = Axis((0, 0, 0), (0, 1, 0))
    for i in range(1, PATTERN_CIRCULAR_1_COUNT):
        add(hole_wizard_m51.rotate(pattern_circular_1_axis, i * 360 / PATTERN_CIRCULAR_1_COUNT), mode=Mode.SUBTRACT)

    # Отверстие с зазором M41
    with Locations(Plane(origin=(0, -2.978246769, 0), x_dir=(1, 0, 0), z_dir=(0, 1, 0))):
        with Locations((0, 0)):
            Hole(HOLE_WIZARD_M41_D / 2, depth=HOLE_WIZARD_M41_DEPTH)
            with Locations((0, 0, -(HOLE_WIZARD_M41_DEPTH + HOLE_WIZARD_M41_TIP / 2))):  # 118° drill point
                Cone(0, HOLE_WIZARD_M41_D / 2, HOLE_WIZARD_M41_TIP, mode=Mode.SUBTRACT)

    # Эскиз14 → Вырез-Вытянуть5 (cut)
    with BuildSketch(Plane.XZ.offset(62.978246769)):
        Circle(SKETCH_14_R)
        with Locations(Location((0, 0, 0), (0, 0, 180))):
            Circle(SKETCH_14_R_2, mode=Mode.SUBTRACT)
    extrude(amount=-CUT_EXTRUDE_5_DEPTH, mode=Mode.SUBTRACT)


solid = part.part
